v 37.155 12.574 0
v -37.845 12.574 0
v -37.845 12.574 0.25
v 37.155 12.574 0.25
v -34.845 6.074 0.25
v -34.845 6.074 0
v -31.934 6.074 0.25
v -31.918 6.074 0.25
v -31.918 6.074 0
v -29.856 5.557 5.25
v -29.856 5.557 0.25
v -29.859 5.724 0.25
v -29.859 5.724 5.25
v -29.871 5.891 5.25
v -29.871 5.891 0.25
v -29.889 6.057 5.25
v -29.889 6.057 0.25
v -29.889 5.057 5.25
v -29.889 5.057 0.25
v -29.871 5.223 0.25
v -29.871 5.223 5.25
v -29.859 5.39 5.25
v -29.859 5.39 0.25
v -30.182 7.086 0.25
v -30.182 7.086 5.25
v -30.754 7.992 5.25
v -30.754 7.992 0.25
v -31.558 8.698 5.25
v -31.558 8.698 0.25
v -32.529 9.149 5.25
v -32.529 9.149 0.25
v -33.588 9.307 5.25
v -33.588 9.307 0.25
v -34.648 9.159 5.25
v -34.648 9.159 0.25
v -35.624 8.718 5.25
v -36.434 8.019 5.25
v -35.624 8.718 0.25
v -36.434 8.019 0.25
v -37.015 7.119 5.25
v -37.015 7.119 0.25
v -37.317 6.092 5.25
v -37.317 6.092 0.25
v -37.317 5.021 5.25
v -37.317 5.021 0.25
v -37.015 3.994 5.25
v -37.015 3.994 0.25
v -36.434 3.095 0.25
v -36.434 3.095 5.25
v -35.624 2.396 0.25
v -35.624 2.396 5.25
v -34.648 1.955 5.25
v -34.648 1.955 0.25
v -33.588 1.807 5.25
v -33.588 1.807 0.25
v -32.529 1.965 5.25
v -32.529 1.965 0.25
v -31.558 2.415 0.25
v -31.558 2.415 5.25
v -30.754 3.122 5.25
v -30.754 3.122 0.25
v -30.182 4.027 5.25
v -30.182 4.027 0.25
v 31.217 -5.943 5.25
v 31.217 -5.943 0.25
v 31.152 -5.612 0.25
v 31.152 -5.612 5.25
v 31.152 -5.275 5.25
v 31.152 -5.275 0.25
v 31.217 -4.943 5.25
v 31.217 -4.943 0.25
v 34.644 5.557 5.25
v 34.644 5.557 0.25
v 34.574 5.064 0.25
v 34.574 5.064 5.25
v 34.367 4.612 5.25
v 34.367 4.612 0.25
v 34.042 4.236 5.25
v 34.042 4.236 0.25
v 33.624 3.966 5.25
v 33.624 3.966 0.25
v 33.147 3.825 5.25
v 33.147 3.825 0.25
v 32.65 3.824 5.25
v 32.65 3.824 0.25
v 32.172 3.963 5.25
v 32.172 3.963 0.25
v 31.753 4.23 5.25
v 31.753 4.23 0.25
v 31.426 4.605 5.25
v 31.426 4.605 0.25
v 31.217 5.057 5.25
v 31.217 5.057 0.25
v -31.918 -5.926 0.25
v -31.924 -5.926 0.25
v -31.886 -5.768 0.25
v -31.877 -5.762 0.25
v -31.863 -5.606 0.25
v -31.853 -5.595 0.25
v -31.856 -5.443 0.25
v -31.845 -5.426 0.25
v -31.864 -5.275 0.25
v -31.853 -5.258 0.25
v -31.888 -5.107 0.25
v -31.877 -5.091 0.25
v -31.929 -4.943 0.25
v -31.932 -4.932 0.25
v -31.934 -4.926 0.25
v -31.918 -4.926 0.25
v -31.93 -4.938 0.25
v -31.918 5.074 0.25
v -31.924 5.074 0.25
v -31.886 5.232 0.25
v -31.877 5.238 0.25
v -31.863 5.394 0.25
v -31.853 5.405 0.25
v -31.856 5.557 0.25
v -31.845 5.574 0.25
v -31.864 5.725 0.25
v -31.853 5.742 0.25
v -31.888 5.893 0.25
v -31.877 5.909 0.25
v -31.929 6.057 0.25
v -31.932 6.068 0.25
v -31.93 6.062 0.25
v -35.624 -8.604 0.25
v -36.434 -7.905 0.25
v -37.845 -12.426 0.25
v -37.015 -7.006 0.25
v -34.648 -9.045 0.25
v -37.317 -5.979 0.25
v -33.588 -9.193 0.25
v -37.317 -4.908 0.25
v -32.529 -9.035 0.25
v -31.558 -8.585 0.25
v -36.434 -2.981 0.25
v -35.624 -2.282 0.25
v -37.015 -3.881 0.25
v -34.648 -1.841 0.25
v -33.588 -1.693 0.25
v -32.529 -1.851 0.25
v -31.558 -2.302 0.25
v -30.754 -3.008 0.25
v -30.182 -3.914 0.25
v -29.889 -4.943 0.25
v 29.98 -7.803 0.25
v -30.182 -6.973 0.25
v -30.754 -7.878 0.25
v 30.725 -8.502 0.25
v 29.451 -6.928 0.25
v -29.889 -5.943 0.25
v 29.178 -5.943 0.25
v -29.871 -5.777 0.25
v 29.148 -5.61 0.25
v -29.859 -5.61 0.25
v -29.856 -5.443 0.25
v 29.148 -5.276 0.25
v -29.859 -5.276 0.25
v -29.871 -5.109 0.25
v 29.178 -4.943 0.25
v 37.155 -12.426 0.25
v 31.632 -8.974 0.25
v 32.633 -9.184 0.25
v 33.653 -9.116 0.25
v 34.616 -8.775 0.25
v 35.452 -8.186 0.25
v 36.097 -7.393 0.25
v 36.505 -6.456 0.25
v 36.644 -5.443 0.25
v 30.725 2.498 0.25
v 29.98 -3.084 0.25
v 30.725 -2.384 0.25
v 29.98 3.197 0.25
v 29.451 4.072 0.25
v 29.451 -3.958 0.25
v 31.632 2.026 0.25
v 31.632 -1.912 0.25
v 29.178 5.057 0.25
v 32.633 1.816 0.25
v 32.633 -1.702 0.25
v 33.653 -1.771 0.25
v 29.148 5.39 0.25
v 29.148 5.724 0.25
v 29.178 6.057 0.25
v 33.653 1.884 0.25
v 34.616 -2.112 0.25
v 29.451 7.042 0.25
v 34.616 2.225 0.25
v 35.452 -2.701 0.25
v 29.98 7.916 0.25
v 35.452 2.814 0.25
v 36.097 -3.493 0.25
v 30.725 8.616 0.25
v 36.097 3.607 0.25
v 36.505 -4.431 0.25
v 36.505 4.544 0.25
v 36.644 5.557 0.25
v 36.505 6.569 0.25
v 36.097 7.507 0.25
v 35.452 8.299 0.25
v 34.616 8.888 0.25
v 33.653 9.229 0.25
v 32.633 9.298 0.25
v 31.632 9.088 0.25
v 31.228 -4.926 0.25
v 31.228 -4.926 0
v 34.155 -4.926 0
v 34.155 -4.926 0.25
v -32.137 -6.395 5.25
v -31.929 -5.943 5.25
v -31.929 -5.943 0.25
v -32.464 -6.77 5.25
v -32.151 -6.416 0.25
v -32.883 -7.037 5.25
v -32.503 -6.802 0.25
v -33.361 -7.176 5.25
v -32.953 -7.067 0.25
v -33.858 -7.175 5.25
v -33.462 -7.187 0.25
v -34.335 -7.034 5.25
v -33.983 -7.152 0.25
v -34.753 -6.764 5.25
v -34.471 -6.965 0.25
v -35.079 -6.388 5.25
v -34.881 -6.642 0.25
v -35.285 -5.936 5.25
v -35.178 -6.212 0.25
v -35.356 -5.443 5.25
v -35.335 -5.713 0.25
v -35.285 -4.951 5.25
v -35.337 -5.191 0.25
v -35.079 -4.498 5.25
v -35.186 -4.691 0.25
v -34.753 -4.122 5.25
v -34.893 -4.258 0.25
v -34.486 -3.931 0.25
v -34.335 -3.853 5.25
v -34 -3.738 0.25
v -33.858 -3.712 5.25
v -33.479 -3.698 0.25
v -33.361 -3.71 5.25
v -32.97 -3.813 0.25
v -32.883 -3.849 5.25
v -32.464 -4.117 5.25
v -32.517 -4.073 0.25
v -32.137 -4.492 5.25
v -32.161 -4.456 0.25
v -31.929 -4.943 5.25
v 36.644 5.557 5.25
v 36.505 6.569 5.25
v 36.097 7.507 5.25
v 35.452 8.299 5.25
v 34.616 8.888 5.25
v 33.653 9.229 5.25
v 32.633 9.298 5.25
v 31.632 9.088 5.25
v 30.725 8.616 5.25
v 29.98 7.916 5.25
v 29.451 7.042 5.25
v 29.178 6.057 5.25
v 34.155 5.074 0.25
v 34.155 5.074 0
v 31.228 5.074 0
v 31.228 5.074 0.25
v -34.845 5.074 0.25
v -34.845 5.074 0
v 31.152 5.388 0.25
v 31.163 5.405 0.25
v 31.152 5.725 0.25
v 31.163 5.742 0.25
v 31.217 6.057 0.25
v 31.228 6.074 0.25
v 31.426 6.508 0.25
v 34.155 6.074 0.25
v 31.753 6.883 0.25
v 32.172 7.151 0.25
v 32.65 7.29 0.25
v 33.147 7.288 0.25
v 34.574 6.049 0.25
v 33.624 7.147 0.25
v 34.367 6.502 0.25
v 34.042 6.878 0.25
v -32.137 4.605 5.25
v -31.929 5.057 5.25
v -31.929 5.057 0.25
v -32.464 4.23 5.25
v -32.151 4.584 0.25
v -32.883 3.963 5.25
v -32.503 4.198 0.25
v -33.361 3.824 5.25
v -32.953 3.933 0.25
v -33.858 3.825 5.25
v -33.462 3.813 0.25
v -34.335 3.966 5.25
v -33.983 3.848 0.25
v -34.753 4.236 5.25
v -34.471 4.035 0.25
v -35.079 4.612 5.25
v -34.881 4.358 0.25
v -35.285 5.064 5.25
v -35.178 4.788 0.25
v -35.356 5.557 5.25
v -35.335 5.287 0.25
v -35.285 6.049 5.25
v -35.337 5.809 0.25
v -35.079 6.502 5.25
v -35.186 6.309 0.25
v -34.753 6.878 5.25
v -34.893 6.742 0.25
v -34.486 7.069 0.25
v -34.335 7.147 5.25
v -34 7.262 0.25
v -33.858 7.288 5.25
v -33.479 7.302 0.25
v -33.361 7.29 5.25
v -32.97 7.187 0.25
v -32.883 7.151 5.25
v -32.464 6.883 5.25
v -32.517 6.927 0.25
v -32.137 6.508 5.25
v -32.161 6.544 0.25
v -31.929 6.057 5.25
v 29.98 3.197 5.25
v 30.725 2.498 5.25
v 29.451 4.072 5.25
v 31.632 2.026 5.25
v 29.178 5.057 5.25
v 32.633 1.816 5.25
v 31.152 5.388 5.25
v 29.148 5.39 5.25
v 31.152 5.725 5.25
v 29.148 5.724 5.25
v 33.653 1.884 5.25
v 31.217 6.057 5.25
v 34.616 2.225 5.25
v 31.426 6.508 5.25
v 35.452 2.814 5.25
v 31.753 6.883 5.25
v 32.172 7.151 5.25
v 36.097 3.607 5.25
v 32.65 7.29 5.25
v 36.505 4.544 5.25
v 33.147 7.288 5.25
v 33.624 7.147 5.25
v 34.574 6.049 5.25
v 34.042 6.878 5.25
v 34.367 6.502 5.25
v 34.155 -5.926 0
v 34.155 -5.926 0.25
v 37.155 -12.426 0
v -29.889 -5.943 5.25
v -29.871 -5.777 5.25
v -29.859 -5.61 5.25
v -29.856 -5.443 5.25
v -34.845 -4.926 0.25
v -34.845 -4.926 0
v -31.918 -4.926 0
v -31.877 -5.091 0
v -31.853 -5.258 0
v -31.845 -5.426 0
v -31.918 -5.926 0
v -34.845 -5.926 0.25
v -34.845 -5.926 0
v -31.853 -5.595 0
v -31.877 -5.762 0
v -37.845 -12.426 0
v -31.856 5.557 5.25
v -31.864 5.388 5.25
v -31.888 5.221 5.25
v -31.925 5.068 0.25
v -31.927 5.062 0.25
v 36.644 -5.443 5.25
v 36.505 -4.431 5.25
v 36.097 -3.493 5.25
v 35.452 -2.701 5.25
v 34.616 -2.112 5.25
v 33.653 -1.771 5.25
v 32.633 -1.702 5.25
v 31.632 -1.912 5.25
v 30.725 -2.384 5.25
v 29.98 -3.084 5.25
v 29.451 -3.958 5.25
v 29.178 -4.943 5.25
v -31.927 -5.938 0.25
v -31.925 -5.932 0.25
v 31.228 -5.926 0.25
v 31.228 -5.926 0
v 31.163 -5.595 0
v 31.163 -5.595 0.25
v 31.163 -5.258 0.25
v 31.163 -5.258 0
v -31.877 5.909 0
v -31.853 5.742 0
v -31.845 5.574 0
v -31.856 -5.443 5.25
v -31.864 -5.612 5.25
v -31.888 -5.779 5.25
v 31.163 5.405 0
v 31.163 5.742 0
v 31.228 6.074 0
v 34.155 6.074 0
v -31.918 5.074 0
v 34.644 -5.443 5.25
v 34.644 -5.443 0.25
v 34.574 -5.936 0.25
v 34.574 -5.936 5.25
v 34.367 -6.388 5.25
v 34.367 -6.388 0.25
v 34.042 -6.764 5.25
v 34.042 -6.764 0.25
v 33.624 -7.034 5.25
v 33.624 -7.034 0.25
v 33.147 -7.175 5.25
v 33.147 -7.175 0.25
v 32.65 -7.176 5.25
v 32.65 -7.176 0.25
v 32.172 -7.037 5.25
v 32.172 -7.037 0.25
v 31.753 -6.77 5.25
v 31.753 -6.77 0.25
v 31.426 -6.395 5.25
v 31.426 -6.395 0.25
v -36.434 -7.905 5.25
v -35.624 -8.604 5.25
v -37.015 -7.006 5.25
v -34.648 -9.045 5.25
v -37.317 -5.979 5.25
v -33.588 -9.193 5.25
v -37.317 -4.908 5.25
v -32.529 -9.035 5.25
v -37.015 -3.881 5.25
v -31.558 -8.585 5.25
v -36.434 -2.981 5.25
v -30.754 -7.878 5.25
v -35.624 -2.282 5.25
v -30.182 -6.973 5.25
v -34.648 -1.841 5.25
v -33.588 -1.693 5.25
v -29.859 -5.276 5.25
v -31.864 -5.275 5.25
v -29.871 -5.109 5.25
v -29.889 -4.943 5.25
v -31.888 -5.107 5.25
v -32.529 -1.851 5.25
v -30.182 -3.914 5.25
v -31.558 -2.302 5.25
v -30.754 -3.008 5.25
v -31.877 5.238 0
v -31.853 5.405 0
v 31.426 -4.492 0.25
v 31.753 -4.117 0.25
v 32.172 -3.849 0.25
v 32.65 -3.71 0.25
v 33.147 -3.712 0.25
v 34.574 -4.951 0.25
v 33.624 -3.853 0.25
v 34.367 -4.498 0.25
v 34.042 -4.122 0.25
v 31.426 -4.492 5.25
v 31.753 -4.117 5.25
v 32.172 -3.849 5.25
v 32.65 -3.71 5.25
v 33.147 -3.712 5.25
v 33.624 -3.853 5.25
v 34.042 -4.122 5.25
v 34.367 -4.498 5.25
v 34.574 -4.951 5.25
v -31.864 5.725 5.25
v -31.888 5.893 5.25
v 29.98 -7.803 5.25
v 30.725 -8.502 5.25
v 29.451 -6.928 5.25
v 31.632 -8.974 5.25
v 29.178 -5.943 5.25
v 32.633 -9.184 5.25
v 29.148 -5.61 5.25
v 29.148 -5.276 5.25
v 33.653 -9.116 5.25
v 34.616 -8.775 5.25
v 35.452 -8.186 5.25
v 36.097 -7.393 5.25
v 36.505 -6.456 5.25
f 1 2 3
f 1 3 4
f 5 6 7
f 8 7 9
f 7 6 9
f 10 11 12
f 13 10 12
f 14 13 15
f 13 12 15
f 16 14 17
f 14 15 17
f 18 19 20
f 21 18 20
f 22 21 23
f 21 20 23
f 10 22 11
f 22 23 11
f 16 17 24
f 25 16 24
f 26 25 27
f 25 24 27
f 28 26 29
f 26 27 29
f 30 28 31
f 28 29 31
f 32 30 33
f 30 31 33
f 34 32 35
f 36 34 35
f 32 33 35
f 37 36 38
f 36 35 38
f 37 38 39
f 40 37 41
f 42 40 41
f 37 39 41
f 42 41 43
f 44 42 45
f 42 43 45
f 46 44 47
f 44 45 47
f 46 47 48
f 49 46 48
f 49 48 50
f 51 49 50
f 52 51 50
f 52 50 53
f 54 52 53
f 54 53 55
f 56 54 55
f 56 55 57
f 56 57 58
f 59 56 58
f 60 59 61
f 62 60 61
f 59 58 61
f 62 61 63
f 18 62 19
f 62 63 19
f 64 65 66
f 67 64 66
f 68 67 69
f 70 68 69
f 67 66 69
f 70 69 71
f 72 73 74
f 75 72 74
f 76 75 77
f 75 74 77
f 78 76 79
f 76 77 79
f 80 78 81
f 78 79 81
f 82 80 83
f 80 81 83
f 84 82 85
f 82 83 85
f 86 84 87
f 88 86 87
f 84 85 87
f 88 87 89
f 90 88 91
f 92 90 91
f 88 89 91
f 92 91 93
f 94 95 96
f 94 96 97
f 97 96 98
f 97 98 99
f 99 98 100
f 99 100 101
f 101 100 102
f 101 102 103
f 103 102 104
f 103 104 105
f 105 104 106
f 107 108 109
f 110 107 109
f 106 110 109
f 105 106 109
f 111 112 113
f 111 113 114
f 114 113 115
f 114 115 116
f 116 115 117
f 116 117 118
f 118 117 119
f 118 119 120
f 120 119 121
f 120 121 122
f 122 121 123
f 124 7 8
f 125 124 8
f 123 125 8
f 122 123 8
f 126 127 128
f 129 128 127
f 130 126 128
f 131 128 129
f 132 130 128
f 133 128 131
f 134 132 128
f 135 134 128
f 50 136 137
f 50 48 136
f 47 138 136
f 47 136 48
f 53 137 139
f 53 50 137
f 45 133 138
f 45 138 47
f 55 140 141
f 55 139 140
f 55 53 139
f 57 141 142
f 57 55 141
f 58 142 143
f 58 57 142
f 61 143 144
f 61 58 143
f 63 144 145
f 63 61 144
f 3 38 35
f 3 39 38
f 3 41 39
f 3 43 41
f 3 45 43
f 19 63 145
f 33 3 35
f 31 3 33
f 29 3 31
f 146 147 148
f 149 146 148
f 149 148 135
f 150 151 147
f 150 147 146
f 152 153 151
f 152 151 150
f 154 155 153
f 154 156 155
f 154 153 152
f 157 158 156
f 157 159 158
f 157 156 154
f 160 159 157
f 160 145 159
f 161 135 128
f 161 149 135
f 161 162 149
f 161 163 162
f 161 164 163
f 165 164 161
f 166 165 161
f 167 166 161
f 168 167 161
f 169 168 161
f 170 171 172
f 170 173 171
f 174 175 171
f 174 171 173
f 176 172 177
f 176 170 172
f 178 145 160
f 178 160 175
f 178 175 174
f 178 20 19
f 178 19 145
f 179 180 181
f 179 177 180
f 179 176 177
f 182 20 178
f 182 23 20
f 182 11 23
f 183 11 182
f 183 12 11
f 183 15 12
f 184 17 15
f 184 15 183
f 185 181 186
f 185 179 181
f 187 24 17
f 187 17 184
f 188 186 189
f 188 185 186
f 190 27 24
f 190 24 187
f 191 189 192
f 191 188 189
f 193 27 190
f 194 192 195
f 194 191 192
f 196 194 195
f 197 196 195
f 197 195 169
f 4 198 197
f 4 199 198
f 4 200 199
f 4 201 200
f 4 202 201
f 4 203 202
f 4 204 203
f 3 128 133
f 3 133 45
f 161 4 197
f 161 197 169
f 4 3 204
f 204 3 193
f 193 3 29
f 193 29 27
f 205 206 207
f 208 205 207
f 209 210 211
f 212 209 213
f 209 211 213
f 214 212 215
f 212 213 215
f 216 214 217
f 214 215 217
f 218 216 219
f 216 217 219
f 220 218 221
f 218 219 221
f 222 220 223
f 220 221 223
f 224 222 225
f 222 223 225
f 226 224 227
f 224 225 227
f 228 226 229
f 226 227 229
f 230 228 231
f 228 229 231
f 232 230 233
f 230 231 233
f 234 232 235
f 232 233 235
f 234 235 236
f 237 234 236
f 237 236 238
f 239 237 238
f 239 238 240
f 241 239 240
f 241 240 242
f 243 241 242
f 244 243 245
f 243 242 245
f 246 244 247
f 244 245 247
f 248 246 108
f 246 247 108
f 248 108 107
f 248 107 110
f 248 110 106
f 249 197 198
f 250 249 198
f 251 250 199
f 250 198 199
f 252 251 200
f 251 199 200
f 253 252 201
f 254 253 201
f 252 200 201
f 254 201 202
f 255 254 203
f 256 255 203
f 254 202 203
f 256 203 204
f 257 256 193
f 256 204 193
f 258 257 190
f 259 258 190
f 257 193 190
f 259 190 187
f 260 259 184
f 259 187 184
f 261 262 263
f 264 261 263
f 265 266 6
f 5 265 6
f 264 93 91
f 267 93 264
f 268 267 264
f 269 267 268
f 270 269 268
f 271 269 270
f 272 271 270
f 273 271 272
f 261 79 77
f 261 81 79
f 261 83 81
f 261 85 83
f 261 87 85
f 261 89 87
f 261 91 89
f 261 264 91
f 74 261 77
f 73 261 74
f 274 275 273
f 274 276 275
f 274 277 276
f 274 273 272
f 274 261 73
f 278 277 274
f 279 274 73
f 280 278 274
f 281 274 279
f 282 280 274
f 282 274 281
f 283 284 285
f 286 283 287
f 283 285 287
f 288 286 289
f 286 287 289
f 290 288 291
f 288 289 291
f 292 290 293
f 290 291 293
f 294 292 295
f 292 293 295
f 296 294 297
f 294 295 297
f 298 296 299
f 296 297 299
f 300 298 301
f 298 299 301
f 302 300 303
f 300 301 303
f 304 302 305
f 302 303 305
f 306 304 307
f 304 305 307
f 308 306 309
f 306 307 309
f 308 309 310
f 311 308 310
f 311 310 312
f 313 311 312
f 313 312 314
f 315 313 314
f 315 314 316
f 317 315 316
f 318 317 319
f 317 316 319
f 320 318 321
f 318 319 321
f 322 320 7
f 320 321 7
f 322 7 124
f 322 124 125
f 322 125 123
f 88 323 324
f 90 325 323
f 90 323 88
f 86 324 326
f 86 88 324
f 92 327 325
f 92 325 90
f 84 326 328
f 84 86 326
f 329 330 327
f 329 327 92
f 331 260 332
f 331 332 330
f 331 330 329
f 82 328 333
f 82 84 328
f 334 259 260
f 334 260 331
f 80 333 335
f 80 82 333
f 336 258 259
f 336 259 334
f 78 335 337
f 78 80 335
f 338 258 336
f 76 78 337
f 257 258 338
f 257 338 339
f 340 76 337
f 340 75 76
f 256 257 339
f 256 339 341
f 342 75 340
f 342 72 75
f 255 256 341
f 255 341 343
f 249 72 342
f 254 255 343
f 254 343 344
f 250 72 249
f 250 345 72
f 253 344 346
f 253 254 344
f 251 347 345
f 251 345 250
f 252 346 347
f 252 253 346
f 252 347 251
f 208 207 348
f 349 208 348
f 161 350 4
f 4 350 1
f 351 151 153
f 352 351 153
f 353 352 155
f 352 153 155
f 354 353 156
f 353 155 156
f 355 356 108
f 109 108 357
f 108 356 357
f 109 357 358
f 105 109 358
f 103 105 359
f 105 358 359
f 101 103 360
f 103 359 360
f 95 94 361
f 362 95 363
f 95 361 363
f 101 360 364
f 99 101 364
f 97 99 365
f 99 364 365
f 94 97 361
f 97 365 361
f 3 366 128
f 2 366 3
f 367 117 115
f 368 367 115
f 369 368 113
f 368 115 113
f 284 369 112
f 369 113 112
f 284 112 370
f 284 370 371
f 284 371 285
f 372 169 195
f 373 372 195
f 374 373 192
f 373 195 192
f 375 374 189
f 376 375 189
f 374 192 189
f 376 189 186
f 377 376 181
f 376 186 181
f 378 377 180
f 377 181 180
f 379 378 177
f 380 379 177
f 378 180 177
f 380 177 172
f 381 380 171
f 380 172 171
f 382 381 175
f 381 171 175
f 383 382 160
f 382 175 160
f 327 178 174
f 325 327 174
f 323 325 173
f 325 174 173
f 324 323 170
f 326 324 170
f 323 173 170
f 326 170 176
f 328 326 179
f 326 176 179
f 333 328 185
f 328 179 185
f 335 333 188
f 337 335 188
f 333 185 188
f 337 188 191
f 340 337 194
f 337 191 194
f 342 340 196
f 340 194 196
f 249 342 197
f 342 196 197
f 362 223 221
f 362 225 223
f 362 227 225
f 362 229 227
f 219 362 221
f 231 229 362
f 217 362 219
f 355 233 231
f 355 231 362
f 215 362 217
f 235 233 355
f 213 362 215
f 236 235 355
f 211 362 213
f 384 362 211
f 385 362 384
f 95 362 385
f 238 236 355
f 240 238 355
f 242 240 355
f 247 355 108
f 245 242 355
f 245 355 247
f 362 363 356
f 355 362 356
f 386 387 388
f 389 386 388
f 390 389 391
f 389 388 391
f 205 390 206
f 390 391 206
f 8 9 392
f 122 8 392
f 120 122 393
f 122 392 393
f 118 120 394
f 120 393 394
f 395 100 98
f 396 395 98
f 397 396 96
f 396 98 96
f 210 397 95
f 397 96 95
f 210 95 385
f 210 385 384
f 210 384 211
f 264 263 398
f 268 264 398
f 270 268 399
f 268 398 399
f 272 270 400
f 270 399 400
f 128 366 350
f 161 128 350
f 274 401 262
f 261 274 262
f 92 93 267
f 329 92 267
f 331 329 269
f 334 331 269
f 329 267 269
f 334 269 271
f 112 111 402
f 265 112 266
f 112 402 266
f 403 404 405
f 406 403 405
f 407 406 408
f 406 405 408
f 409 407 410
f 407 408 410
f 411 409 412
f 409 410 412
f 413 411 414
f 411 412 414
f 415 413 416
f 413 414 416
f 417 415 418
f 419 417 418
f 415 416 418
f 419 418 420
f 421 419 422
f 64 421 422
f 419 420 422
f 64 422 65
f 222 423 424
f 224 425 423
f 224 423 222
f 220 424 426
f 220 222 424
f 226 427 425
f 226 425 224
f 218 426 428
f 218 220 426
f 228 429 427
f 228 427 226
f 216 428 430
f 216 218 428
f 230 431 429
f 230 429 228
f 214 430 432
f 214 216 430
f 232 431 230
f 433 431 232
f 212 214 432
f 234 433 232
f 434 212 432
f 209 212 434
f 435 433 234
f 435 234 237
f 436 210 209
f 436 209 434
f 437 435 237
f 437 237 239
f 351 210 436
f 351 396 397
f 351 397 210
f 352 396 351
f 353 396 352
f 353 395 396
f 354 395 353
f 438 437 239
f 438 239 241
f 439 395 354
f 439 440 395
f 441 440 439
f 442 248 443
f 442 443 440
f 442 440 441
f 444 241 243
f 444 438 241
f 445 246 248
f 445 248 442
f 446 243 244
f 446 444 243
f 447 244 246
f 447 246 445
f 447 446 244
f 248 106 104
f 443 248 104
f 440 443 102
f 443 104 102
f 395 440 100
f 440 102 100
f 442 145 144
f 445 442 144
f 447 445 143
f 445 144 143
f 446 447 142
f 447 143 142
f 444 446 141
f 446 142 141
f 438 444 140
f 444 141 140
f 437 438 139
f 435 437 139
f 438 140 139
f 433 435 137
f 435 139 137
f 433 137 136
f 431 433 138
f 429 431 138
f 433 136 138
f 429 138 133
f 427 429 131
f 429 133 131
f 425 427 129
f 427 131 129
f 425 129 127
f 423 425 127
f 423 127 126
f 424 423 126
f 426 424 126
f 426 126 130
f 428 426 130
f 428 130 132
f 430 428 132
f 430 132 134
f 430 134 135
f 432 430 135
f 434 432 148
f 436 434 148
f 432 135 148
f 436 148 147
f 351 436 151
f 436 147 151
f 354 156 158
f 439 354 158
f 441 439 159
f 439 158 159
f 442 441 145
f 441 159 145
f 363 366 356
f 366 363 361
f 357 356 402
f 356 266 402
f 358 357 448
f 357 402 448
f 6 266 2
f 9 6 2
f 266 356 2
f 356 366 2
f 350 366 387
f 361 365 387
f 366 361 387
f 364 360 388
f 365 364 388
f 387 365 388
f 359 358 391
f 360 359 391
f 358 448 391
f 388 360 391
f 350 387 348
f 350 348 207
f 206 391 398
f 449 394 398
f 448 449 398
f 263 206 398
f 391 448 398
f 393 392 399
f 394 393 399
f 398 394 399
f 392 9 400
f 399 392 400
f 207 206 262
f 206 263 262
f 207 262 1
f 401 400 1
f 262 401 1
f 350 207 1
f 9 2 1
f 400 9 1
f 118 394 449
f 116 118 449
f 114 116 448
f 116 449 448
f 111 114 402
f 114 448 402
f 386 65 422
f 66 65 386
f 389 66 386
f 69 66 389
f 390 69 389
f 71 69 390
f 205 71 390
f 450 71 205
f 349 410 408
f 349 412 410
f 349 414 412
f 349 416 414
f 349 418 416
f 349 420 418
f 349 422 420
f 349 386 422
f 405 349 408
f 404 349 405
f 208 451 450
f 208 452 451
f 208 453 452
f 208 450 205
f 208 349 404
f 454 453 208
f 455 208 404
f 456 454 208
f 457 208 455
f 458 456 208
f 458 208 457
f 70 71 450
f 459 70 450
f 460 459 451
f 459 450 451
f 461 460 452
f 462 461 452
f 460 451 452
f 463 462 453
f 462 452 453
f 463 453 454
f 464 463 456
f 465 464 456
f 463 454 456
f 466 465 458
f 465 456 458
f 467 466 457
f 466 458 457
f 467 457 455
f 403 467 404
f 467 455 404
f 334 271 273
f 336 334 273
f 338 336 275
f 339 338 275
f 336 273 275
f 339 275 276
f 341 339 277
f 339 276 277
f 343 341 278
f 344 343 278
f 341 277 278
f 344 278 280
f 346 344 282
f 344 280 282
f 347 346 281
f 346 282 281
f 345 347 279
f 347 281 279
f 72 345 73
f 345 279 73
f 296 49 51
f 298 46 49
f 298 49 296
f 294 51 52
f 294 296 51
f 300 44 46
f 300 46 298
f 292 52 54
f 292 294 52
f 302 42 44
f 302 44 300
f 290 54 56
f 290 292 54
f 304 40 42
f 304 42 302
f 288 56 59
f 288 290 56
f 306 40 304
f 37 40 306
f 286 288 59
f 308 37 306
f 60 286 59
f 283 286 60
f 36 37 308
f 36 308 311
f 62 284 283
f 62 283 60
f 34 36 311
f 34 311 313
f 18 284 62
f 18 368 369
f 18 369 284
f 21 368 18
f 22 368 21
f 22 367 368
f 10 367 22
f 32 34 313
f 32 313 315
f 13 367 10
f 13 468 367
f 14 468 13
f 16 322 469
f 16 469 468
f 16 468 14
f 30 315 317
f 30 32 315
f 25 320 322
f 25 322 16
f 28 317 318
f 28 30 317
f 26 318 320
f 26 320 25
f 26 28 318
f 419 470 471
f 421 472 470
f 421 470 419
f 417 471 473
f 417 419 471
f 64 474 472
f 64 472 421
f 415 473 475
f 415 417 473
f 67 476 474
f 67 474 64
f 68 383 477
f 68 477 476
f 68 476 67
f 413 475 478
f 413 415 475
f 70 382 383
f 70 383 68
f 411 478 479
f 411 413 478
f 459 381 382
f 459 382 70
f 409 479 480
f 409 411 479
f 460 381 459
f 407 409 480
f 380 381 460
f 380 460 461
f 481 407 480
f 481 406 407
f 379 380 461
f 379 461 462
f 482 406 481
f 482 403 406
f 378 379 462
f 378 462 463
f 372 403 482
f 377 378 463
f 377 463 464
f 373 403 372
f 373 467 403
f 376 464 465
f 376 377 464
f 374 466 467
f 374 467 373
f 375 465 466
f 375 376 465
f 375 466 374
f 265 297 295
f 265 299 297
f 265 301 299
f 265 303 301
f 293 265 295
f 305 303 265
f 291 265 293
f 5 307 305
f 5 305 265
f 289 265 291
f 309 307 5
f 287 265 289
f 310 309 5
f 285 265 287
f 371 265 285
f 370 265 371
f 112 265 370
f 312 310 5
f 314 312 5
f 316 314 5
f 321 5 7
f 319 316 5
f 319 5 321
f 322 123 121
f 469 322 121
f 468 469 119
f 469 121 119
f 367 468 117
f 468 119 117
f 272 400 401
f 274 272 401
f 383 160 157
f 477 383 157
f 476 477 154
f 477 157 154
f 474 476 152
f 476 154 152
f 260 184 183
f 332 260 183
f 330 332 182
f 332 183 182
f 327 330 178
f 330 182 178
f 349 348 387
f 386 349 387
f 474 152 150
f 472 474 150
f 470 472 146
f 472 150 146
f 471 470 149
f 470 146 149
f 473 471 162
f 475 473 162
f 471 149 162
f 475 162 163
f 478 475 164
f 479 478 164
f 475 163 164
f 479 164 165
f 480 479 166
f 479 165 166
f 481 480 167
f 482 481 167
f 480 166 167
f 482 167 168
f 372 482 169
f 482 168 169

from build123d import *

# Parameters (mm, degrees)
F0_W     = 75
F0_H     = 25
F1_DEPTH = 0.25
F4_DEPTH = 5


with BuildPart() as f1:
    # F0 (on Top) → F1 (new body)
    with BuildSketch(Plane.XY):
        with Locations((-0.3449308872, 0.0735294118)):
            Rectangle(F0_W, F0_H)
        with BuildLine():
            ThreePointArc((-29.8784137004, -5.9264705882), (-37.3449308872, -5.4264705882), (-29.8784137004, -4.9264705882))
            Line((-29.8784137004, -4.9264705882), (-28.3449308872, -4.9264705882))
            Line((-28.3449308872, -4.9264705882), (-24.3449308872, -1.4264705882))
            Line((-24.3449308872, -1.4264705882), (23.6550691128, -1.4264705882))
            Line((23.6550691128, -1.4264705882), (27.6550691128, -4.9264705882))
            Line((27.6550691128, -4.9264705882), (29.1885519259, -4.9264705882))
            ThreePointArc((29.1885519259, -4.9264705882), (33.1556290351, -1.6848506549), (36.6550691128, -5.4264705882))
            ThreePointArc((36.6550691128, -5.4264705882), (33.1556290351, -9.1680905215), (29.1885519259, -5.9264705882))
            Line((29.1885519259, -5.9264705882), (27.6550691128, -5.9264705882))
            Line((27.6550691128, -5.9264705882), (23.6550691128, -9.4264705882))
            Line((23.6550691128, -9.4264705882), (-24.3449308872, -9.4264705882))
            Line((-24.3449308872, -9.4264705882), (-28.3449308872, -5.9264705882))
            Line((-28.3449308872, -5.9264705882), (-29.8784137004, -5.9264705882))
        make_face(mode=Mode.SUBTRACT)
        with BuildLine():
            ThreePointArc((-29.8784137004, 5.0735294118), (-37.3449308872, 5.5735294118), (-29.8784137004, 6.0735294118))
            Line((-29.8784137004, 6.0735294118), (-28.3449308872, 6.0735294118))
            Line((-28.3449308872, 6.0735294118), (-24.3449308872, 9.5735294118))
            Line((-24.3449308872, 9.5735294118), (23.6550691128, 9.5735294118))
            Line((23.6550691128, 9.5735294118), (27.6550691128, 6.0735294118))
            Line((27.6550691128, 6.0735294118), (29.1885519259, 6.0735294118))
            ThreePointArc((29.1885519259, 6.0735294118), (33.1556290351, 9.3151493451), (36.6550691128, 5.5735294118))
            ThreePointArc((36.6550691128, 5.5735294118), (33.1556290351, 1.8319094785), (29.1885519259, 5.0735294118))
            Line((29.1885519259, 5.0735294118), (27.6550691128, 5.0735294118))
            Line((27.6550691128, 5.0735294118), (23.6550691128, 1.5735294118))
            Line((23.6550691128, 1.5735294118), (-24.3449308872, 1.5735294118))
            Line((-24.3449308872, 1.5735294118), (-28.3449308872, 5.0735294118))
            Line((-28.3449308872, 5.0735294118), (-29.8784137004, 5.0735294118))
        make_face(mode=Mode.SUBTRACT)
        with BuildLine():
            Line((29.1885519259, 6.0735294118), (27.6550691128, 6.0735294118))
            Line((27.6550691128, 6.0735294118), (27.6550691128, 5.0735294118))
            Line((27.6550691128, 5.0735294118), (29.1885519259, 5.0735294118))
            ThreePointArc((29.1885519259, 5.0735294118), (29.1550691128, 5.5735294118), (29.1885519259, 6.0735294118))
        make_face()
        with BuildLine():
            ThreePointArc((36.6550691128, 5.5735294118), (33.1556290351, 9.3151493451), (29.1885519259, 6.0735294118))
            Line((29.1885519259, 6.0735294118), (31.2280181297, 6.0735294118))
            ThreePointArc((31.2280181297, 6.0735294118), (33.1577158815, 7.3051961263), (34.6550691128, 5.5735294118))
            ThreePointArc((34.6550691128, 5.5735294118), (33.1577158815, 3.8418626972), (31.2280181297, 5.0735294118))
            Line((31.2280181297, 5.0735294118), (29.1885519259, 5.0735294118))
            ThreePointArc((29.1885519259, 5.0735294118), (33.1556290351, 1.8319094785), (36.6550691128, 5.5735294118))
        make_face()
        with BuildLine():
            Line((31.2280181297, 6.0735294118), (29.1885519259, 6.0735294118))
            ThreePointArc((29.1885519259, 6.0735294118), (29.1550691128, 5.5735294118), (29.1885519259, 5.0735294118))
            Line((29.1885519259, 5.0735294118), (31.2280181297, 5.0735294118))
            ThreePointArc((31.2280181297, 5.0735294118), (31.1550691128, 5.5735294118), (31.2280181297, 6.0735294118))
        make_face()
        with BuildLine():
            ThreePointArc((34.6550691128, 5.5735294118), (33.1577158815, 7.3051961263), (31.2280181297, 6.0735294118))
            Line((31.2280181297, 6.0735294118), (34.1550691128, 6.0735294118))
            Line((34.1550691128, 6.0735294118), (34.1550691128, 5.0735294118))
            Line((34.1550691128, 5.0735294118), (31.2280181297, 5.0735294118))
            ThreePointArc((31.2280181297, 5.0735294118), (33.1577158815, 3.8418626972), (34.6550691128, 5.5735294118))
        make_face()
        with BuildLine():
            Line((29.1885519259, -4.9264705882), (27.6550691128, -4.9264705882))
            Line((27.6550691128, -4.9264705882), (27.6550691128, -5.9264705882))
            Line((27.6550691128, -5.9264705882), (29.1885519259, -5.9264705882))
            ThreePointArc((29.1885519259, -5.9264705882), (29.1550691128, -5.4264705882), (29.1885519259, -4.9264705882))
        make_face()
        with BuildLine():
            Line((31.2280181297, -4.9264705882), (29.1885519259, -4.9264705882))
            ThreePointArc((29.1885519259, -4.9264705882), (29.1550691128, -5.4264705882), (29.1885519259, -5.9264705882))
            Line((29.1885519259, -5.9264705882), (31.2280181297, -5.9264705882))
            ThreePointArc((31.2280181297, -5.9264705882), (31.1550691128, -5.4264705882), (31.2280181297, -4.9264705882))
        make_face()
        with BuildLine():
            ThreePointArc((36.6550691128, -5.4264705882), (33.1556290351, -1.6848506549), (29.1885519259, -4.9264705882))
            Line((29.1885519259, -4.9264705882), (31.2280181297, -4.9264705882))
            ThreePointArc((31.2280181297, -4.9264705882), (33.1577158815, -3.6948038737), (34.6550691128, -5.4264705882))
            ThreePointArc((34.6550691128, -5.4264705882), (33.1577158815, -7.1581373028), (31.2280181297, -5.9264705882))
            Line((31.2280181297, -5.9264705882), (29.1885519259, -5.9264705882))
            ThreePointArc((29.1885519259, -5.9264705882), (33.1556290351, -9.1680905215), (36.6550691128, -5.4264705882))
        make_face()
        with BuildLine():
            ThreePointArc((34.6550691128, -5.4264705882), (33.1577158815, -3.6948038737), (31.2280181297, -4.9264705882))
            Line((31.2280181297, -4.9264705882), (34.1550691128, -4.9264705882))
            Line((34.1550691128, -4.9264705882), (34.1550691128, -5.9264705882))
            Line((34.1550691128, -5.9264705882), (31.2280181297, -5.9264705882))
            ThreePointArc((31.2280181297, -5.9264705882), (33.1577158815, -7.1581373028), (34.6550691128, -5.4264705882))
        make_face()
        Polygon((-24.3449308872, -1.4264705882), (-28.3449308872, -4.9264705882), (-28.3449308872, -5.9264705882), (-24.3449308872, -9.4264705882), (23.6550691128, -9.4264705882), (27.6550691128, -5.9264705882), (27.6550691128, -4.9264705882), (23.6550691128, -1.4264705882), align=None)
        Polygon((-24.3449308872, 9.5735294118), (-28.3449308872, 6.0735294118), (-28.3449308872, 5.0735294118), (-24.3449308872, 1.5735294118), (23.6550691128, 1.5735294118), (27.6550691128, 5.0735294118), (27.6550691128, 6.0735294118), (23.6550691128, 9.5735294118), align=None)
        with BuildLine():
            Line((-28.3449308872, 6.0735294118), (-29.8784137004, 6.0735294118))
            ThreePointArc((-29.8784137004, 6.0735294118), (-29.8533109539, 5.8240893341), (-29.8449308872, 5.5735294118))
            ThreePointArc((-29.8449308872, 5.5735294118), (-29.8533109539, 5.3229694894), (-29.8784137004, 5.0735294118))
            Line((-29.8784137004, 5.0735294118), (-28.3449308872, 5.0735294118))
            Line((-28.3449308872, 5.0735294118), (-28.3449308872, 6.0735294118))
        make_face()
        with BuildLine():
            Line((-28.3449308872, -4.9264705882), (-29.8784137004, -4.9264705882))
            ThreePointArc((-29.8784137004, -4.9264705882), (-29.8533109539, -5.1759106659), (-29.8449308872, -5.4264705882))
            ThreePointArc((-29.8449308872, -5.4264705882), (-29.8533109539, -5.6770305106), (-29.8784137004, -5.9264705882))
            Line((-29.8784137004, -5.9264705882), (-28.3449308872, -5.9264705882))
            Line((-28.3449308872, -5.9264705882), (-28.3449308872, -4.9264705882))
        make_face()
        with BuildLine():
            ThreePointArc((-31.9178799041, -5.9264705882), (-35.3449308872, -5.4264705882), (-31.9178799041, -4.9264705882))
            Line((-31.9178799041, -4.9264705882), (-29.8784137004, -4.9264705882))
            ThreePointArc((-29.8784137004, -4.9264705882), (-37.3449308872, -5.4264705882), (-29.8784137004, -5.9264705882))
            Line((-29.8784137004, -5.9264705882), (-31.9178799041, -5.9264705882))
        make_face()
        with BuildLine():
            Line((-29.8784137004, -4.9264705882), (-31.9178799041, -4.9264705882))
            ThreePointArc((-31.9178799041, -4.9264705882), (-31.8632641727, -5.1738238195), (-31.8449308872, -5.4264705882))
            ThreePointArc((-31.8449308872, -5.4264705882), (-31.8632641727, -5.679117357), (-31.9178799041, -5.9264705882))
            Line((-31.9178799041, -5.9264705882), (-29.8784137004, -5.9264705882))
            ThreePointArc((-29.8784137004, -5.9264705882), (-29.8533109539, -5.6770305106), (-29.8449308872, -5.4264705882))
            ThreePointArc((-29.8449308872, -5.4264705882), (-29.8533109539, -5.1759106659), (-29.8784137004, -4.9264705882))
        make_face()
        with BuildLine():
            Line((-34.8449308872, -5.9264705882), (-34.8449308872, -4.9264705882))
            Line((-34.8449308872, -4.9264705882), (-31.9178799041, -4.9264705882))
            ThreePointArc((-31.9178799041, -4.9264705882), (-35.3449308872, -5.4264705882), (-31.9178799041, -5.9264705882))
            Line((-31.9178799041, -5.9264705882), (-34.8449308872, -5.9264705882))
        make_face()
        with BuildLine():
            ThreePointArc((-31.9178799041, 5.0735294118), (-35.3449308872, 5.5735294118), (-31.9178799041, 6.0735294118))
            Line((-31.9178799041, 6.0735294118), (-29.8784137004, 6.0735294118))
            ThreePointArc((-29.8784137004, 6.0735294118), (-37.3449308872, 5.5735294118), (-29.8784137004, 5.0735294118))
            Line((-29.8784137004, 5.0735294118), (-31.9178799041, 5.0735294118))
        make_face()
        with BuildLine():
            Line((-29.8784137004, 6.0735294118), (-31.9178799041, 6.0735294118))
            ThreePointArc((-31.9178799041, 6.0735294118), (-31.8632641727, 5.8261761805), (-31.8449308872, 5.5735294118))
            ThreePointArc((-31.8449308872, 5.5735294118), (-31.8632641727, 5.320882643), (-31.9178799041, 5.0735294118))
            Line((-31.9178799041, 5.0735294118), (-29.8784137004, 5.0735294118))
            ThreePointArc((-29.8784137004, 5.0735294118), (-29.8533109539, 5.3229694894), (-29.8449308872, 5.5735294118))
            ThreePointArc((-29.8449308872, 5.5735294118), (-29.8533109539, 5.8240893341), (-29.8784137004, 6.0735294118))
        make_face()
        with BuildLine():
            Line((-34.8449308872, 5.0735294118), (-34.8449308872, 6.0735294118))
            Line((-34.8449308872, 6.0735294118), (-31.9178799041, 6.0735294118))
            ThreePointArc((-31.9178799041, 6.0735294118), (-35.3449308872, 5.5735294118), (-31.9178799041, 5.0735294118))
            Line((-31.9178799041, 5.0735294118), (-34.8449308872, 5.0735294118))
        make_face()
    extrude(amount=F1_DEPTH)

    # F3 (on offset) → F4 (join)
    with BuildSketch(Plane.XY.offset(0.25)):
        with BuildLine():
            ThreePointArc((36.6443298969, 5.5567010309), (33.1448898193, 9.2983209642), (29.1778127101, 6.0567010309))
            Line((29.1778127101, 6.0567010309), (31.2172789138, 6.0567010309))
            ThreePointArc((31.2172789138, 6.0567010309), (33.1469766657, 7.2883677455), (34.6443298969, 5.5567010309))
            ThreePointArc((34.6443298969, 5.5567010309), (33.1469766657, 3.8250343164), (31.2172789138, 5.0567010309))
            Line((31.2172789138, 5.0567010309), (29.1778127101, 5.0567010309))
            ThreePointArc((29.1778127101, 5.0567010309), (33.1448898193, 1.8150810976), (36.6443298969, 5.5567010309))
        make_face()
        with BuildLine():
            Line((31.2172789138, 6.0567010309), (29.1778127101, 6.0567010309))
            ThreePointArc((29.1778127101, 6.0567010309), (29.1443298969, 5.5567010309), (29.1778127101, 5.0567010309))
            Line((29.1778127101, 5.0567010309), (31.2172789138, 5.0567010309))
            ThreePointArc((31.2172789138, 5.0567010309), (31.1443298969, 5.5567010309), (31.2172789138, 6.0567010309))
        make_face()
        with BuildLine():
            ThreePointArc((36.6443298969, -5.4432989691), (33.1448898193, -1.7016790358), (29.1778127101, -4.9432989691))
            Line((29.1778127101, -4.9432989691), (31.2172789138, -4.9432989691))
            ThreePointArc((31.2172789138, -4.9432989691), (33.1469766657, -3.7116322545), (34.6443298969, -5.4432989691))
            ThreePointArc((34.6443298969, -5.4432989691), (33.1469766657, -7.1749656836), (31.2172789138, -5.9432989691))
            Line((31.2172789138, -5.9432989691), (29.1778127101, -5.9432989691))
            ThreePointArc((29.1778127101, -5.9432989691), (33.1448898193, -9.1849189024), (36.6443298969, -5.4432989691))
        make_face()
        with BuildLine():
            Line((31.2172789138, -4.9432989691), (29.1778127101, -4.9432989691))
            ThreePointArc((29.1778127101, -4.9432989691), (29.1443298969, -5.4432989691), (29.1778127101, -5.9432989691))
            Line((29.1778127101, -5.9432989691), (31.2172789138, -5.9432989691))
            ThreePointArc((31.2172789138, -5.9432989691), (31.1443298969, -5.4432989691), (31.2172789138, -4.9432989691))
        make_face()
        with BuildLine():
            ThreePointArc((-31.92861912, 5.0567010309), (-35.3556701031, 5.5567010309), (-31.92861912, 6.0567010309))
            Line((-31.92861912, 6.0567010309), (-29.8891529163, 6.0567010309))
            ThreePointArc((-29.8891529163, 6.0567010309), (-37.3556701031, 5.5567010309), (-29.8891529163, 5.0567010309))
            Line((-29.8891529163, 5.0567010309), (-31.92861912, 5.0567010309))
        make_face()
        with BuildLine():
            Line((-29.8891529163, 6.0567010309), (-31.92861912, 6.0567010309))
            ThreePointArc((-31.92861912, 6.0567010309), (-31.8740033886, 5.8093477997), (-31.8556701031, 5.5567010309))
            ThreePointArc((-31.8556701031, 5.5567010309), (-31.8740033886, 5.3040542622), (-31.92861912, 5.0567010309))
            Line((-31.92861912, 5.0567010309), (-29.8891529163, 5.0567010309))
            ThreePointArc((-29.8891529163, 5.0567010309), (-29.8640501698, 5.3061411086), (-29.8556701031, 5.5567010309))
            ThreePointArc((-29.8556701031, 5.5567010309), (-29.8640501698, 5.8072609533), (-29.8891529163, 6.0567010309))
        make_face()
        with BuildLine():
            ThreePointArc((-31.92861912, -5.9432989691), (-35.3556701031, -5.4432989691), (-31.92861912, -4.9432989691))
            Line((-31.92861912, -4.9432989691), (-29.8891529163, -4.9432989691))
            ThreePointArc((-29.8891529163, -4.9432989691), (-37.3556701031, -5.4432989691), (-29.8891529163, -5.9432989691))
            Line((-29.8891529163, -5.9432989691), (-31.92861912, -5.9432989691))
        make_face()
        with BuildLine():
            Line((-29.8891529163, -4.9432989691), (-31.92861912, -4.9432989691))
            ThreePointArc((-31.92861912, -4.9432989691), (-31.8740033886, -5.1906522003), (-31.8556701031, -5.4432989691))
            ThreePointArc((-31.8556701031, -5.4432989691), (-31.8740033886, -5.6959457378), (-31.92861912, -5.9432989691))
            Line((-31.92861912, -5.9432989691), (-29.8891529163, -5.9432989691))
            ThreePointArc((-29.8891529163, -5.9432989691), (-29.8640501698, -5.6938588914), (-29.8556701031, -5.4432989691))
            ThreePointArc((-29.8556701031, -5.4432989691), (-29.8640501698, -5.1927390467), (-29.8891529163, -4.9432989691))
        make_face()
    extrude(amount=F4_DEPTH)


solid = f1.part
